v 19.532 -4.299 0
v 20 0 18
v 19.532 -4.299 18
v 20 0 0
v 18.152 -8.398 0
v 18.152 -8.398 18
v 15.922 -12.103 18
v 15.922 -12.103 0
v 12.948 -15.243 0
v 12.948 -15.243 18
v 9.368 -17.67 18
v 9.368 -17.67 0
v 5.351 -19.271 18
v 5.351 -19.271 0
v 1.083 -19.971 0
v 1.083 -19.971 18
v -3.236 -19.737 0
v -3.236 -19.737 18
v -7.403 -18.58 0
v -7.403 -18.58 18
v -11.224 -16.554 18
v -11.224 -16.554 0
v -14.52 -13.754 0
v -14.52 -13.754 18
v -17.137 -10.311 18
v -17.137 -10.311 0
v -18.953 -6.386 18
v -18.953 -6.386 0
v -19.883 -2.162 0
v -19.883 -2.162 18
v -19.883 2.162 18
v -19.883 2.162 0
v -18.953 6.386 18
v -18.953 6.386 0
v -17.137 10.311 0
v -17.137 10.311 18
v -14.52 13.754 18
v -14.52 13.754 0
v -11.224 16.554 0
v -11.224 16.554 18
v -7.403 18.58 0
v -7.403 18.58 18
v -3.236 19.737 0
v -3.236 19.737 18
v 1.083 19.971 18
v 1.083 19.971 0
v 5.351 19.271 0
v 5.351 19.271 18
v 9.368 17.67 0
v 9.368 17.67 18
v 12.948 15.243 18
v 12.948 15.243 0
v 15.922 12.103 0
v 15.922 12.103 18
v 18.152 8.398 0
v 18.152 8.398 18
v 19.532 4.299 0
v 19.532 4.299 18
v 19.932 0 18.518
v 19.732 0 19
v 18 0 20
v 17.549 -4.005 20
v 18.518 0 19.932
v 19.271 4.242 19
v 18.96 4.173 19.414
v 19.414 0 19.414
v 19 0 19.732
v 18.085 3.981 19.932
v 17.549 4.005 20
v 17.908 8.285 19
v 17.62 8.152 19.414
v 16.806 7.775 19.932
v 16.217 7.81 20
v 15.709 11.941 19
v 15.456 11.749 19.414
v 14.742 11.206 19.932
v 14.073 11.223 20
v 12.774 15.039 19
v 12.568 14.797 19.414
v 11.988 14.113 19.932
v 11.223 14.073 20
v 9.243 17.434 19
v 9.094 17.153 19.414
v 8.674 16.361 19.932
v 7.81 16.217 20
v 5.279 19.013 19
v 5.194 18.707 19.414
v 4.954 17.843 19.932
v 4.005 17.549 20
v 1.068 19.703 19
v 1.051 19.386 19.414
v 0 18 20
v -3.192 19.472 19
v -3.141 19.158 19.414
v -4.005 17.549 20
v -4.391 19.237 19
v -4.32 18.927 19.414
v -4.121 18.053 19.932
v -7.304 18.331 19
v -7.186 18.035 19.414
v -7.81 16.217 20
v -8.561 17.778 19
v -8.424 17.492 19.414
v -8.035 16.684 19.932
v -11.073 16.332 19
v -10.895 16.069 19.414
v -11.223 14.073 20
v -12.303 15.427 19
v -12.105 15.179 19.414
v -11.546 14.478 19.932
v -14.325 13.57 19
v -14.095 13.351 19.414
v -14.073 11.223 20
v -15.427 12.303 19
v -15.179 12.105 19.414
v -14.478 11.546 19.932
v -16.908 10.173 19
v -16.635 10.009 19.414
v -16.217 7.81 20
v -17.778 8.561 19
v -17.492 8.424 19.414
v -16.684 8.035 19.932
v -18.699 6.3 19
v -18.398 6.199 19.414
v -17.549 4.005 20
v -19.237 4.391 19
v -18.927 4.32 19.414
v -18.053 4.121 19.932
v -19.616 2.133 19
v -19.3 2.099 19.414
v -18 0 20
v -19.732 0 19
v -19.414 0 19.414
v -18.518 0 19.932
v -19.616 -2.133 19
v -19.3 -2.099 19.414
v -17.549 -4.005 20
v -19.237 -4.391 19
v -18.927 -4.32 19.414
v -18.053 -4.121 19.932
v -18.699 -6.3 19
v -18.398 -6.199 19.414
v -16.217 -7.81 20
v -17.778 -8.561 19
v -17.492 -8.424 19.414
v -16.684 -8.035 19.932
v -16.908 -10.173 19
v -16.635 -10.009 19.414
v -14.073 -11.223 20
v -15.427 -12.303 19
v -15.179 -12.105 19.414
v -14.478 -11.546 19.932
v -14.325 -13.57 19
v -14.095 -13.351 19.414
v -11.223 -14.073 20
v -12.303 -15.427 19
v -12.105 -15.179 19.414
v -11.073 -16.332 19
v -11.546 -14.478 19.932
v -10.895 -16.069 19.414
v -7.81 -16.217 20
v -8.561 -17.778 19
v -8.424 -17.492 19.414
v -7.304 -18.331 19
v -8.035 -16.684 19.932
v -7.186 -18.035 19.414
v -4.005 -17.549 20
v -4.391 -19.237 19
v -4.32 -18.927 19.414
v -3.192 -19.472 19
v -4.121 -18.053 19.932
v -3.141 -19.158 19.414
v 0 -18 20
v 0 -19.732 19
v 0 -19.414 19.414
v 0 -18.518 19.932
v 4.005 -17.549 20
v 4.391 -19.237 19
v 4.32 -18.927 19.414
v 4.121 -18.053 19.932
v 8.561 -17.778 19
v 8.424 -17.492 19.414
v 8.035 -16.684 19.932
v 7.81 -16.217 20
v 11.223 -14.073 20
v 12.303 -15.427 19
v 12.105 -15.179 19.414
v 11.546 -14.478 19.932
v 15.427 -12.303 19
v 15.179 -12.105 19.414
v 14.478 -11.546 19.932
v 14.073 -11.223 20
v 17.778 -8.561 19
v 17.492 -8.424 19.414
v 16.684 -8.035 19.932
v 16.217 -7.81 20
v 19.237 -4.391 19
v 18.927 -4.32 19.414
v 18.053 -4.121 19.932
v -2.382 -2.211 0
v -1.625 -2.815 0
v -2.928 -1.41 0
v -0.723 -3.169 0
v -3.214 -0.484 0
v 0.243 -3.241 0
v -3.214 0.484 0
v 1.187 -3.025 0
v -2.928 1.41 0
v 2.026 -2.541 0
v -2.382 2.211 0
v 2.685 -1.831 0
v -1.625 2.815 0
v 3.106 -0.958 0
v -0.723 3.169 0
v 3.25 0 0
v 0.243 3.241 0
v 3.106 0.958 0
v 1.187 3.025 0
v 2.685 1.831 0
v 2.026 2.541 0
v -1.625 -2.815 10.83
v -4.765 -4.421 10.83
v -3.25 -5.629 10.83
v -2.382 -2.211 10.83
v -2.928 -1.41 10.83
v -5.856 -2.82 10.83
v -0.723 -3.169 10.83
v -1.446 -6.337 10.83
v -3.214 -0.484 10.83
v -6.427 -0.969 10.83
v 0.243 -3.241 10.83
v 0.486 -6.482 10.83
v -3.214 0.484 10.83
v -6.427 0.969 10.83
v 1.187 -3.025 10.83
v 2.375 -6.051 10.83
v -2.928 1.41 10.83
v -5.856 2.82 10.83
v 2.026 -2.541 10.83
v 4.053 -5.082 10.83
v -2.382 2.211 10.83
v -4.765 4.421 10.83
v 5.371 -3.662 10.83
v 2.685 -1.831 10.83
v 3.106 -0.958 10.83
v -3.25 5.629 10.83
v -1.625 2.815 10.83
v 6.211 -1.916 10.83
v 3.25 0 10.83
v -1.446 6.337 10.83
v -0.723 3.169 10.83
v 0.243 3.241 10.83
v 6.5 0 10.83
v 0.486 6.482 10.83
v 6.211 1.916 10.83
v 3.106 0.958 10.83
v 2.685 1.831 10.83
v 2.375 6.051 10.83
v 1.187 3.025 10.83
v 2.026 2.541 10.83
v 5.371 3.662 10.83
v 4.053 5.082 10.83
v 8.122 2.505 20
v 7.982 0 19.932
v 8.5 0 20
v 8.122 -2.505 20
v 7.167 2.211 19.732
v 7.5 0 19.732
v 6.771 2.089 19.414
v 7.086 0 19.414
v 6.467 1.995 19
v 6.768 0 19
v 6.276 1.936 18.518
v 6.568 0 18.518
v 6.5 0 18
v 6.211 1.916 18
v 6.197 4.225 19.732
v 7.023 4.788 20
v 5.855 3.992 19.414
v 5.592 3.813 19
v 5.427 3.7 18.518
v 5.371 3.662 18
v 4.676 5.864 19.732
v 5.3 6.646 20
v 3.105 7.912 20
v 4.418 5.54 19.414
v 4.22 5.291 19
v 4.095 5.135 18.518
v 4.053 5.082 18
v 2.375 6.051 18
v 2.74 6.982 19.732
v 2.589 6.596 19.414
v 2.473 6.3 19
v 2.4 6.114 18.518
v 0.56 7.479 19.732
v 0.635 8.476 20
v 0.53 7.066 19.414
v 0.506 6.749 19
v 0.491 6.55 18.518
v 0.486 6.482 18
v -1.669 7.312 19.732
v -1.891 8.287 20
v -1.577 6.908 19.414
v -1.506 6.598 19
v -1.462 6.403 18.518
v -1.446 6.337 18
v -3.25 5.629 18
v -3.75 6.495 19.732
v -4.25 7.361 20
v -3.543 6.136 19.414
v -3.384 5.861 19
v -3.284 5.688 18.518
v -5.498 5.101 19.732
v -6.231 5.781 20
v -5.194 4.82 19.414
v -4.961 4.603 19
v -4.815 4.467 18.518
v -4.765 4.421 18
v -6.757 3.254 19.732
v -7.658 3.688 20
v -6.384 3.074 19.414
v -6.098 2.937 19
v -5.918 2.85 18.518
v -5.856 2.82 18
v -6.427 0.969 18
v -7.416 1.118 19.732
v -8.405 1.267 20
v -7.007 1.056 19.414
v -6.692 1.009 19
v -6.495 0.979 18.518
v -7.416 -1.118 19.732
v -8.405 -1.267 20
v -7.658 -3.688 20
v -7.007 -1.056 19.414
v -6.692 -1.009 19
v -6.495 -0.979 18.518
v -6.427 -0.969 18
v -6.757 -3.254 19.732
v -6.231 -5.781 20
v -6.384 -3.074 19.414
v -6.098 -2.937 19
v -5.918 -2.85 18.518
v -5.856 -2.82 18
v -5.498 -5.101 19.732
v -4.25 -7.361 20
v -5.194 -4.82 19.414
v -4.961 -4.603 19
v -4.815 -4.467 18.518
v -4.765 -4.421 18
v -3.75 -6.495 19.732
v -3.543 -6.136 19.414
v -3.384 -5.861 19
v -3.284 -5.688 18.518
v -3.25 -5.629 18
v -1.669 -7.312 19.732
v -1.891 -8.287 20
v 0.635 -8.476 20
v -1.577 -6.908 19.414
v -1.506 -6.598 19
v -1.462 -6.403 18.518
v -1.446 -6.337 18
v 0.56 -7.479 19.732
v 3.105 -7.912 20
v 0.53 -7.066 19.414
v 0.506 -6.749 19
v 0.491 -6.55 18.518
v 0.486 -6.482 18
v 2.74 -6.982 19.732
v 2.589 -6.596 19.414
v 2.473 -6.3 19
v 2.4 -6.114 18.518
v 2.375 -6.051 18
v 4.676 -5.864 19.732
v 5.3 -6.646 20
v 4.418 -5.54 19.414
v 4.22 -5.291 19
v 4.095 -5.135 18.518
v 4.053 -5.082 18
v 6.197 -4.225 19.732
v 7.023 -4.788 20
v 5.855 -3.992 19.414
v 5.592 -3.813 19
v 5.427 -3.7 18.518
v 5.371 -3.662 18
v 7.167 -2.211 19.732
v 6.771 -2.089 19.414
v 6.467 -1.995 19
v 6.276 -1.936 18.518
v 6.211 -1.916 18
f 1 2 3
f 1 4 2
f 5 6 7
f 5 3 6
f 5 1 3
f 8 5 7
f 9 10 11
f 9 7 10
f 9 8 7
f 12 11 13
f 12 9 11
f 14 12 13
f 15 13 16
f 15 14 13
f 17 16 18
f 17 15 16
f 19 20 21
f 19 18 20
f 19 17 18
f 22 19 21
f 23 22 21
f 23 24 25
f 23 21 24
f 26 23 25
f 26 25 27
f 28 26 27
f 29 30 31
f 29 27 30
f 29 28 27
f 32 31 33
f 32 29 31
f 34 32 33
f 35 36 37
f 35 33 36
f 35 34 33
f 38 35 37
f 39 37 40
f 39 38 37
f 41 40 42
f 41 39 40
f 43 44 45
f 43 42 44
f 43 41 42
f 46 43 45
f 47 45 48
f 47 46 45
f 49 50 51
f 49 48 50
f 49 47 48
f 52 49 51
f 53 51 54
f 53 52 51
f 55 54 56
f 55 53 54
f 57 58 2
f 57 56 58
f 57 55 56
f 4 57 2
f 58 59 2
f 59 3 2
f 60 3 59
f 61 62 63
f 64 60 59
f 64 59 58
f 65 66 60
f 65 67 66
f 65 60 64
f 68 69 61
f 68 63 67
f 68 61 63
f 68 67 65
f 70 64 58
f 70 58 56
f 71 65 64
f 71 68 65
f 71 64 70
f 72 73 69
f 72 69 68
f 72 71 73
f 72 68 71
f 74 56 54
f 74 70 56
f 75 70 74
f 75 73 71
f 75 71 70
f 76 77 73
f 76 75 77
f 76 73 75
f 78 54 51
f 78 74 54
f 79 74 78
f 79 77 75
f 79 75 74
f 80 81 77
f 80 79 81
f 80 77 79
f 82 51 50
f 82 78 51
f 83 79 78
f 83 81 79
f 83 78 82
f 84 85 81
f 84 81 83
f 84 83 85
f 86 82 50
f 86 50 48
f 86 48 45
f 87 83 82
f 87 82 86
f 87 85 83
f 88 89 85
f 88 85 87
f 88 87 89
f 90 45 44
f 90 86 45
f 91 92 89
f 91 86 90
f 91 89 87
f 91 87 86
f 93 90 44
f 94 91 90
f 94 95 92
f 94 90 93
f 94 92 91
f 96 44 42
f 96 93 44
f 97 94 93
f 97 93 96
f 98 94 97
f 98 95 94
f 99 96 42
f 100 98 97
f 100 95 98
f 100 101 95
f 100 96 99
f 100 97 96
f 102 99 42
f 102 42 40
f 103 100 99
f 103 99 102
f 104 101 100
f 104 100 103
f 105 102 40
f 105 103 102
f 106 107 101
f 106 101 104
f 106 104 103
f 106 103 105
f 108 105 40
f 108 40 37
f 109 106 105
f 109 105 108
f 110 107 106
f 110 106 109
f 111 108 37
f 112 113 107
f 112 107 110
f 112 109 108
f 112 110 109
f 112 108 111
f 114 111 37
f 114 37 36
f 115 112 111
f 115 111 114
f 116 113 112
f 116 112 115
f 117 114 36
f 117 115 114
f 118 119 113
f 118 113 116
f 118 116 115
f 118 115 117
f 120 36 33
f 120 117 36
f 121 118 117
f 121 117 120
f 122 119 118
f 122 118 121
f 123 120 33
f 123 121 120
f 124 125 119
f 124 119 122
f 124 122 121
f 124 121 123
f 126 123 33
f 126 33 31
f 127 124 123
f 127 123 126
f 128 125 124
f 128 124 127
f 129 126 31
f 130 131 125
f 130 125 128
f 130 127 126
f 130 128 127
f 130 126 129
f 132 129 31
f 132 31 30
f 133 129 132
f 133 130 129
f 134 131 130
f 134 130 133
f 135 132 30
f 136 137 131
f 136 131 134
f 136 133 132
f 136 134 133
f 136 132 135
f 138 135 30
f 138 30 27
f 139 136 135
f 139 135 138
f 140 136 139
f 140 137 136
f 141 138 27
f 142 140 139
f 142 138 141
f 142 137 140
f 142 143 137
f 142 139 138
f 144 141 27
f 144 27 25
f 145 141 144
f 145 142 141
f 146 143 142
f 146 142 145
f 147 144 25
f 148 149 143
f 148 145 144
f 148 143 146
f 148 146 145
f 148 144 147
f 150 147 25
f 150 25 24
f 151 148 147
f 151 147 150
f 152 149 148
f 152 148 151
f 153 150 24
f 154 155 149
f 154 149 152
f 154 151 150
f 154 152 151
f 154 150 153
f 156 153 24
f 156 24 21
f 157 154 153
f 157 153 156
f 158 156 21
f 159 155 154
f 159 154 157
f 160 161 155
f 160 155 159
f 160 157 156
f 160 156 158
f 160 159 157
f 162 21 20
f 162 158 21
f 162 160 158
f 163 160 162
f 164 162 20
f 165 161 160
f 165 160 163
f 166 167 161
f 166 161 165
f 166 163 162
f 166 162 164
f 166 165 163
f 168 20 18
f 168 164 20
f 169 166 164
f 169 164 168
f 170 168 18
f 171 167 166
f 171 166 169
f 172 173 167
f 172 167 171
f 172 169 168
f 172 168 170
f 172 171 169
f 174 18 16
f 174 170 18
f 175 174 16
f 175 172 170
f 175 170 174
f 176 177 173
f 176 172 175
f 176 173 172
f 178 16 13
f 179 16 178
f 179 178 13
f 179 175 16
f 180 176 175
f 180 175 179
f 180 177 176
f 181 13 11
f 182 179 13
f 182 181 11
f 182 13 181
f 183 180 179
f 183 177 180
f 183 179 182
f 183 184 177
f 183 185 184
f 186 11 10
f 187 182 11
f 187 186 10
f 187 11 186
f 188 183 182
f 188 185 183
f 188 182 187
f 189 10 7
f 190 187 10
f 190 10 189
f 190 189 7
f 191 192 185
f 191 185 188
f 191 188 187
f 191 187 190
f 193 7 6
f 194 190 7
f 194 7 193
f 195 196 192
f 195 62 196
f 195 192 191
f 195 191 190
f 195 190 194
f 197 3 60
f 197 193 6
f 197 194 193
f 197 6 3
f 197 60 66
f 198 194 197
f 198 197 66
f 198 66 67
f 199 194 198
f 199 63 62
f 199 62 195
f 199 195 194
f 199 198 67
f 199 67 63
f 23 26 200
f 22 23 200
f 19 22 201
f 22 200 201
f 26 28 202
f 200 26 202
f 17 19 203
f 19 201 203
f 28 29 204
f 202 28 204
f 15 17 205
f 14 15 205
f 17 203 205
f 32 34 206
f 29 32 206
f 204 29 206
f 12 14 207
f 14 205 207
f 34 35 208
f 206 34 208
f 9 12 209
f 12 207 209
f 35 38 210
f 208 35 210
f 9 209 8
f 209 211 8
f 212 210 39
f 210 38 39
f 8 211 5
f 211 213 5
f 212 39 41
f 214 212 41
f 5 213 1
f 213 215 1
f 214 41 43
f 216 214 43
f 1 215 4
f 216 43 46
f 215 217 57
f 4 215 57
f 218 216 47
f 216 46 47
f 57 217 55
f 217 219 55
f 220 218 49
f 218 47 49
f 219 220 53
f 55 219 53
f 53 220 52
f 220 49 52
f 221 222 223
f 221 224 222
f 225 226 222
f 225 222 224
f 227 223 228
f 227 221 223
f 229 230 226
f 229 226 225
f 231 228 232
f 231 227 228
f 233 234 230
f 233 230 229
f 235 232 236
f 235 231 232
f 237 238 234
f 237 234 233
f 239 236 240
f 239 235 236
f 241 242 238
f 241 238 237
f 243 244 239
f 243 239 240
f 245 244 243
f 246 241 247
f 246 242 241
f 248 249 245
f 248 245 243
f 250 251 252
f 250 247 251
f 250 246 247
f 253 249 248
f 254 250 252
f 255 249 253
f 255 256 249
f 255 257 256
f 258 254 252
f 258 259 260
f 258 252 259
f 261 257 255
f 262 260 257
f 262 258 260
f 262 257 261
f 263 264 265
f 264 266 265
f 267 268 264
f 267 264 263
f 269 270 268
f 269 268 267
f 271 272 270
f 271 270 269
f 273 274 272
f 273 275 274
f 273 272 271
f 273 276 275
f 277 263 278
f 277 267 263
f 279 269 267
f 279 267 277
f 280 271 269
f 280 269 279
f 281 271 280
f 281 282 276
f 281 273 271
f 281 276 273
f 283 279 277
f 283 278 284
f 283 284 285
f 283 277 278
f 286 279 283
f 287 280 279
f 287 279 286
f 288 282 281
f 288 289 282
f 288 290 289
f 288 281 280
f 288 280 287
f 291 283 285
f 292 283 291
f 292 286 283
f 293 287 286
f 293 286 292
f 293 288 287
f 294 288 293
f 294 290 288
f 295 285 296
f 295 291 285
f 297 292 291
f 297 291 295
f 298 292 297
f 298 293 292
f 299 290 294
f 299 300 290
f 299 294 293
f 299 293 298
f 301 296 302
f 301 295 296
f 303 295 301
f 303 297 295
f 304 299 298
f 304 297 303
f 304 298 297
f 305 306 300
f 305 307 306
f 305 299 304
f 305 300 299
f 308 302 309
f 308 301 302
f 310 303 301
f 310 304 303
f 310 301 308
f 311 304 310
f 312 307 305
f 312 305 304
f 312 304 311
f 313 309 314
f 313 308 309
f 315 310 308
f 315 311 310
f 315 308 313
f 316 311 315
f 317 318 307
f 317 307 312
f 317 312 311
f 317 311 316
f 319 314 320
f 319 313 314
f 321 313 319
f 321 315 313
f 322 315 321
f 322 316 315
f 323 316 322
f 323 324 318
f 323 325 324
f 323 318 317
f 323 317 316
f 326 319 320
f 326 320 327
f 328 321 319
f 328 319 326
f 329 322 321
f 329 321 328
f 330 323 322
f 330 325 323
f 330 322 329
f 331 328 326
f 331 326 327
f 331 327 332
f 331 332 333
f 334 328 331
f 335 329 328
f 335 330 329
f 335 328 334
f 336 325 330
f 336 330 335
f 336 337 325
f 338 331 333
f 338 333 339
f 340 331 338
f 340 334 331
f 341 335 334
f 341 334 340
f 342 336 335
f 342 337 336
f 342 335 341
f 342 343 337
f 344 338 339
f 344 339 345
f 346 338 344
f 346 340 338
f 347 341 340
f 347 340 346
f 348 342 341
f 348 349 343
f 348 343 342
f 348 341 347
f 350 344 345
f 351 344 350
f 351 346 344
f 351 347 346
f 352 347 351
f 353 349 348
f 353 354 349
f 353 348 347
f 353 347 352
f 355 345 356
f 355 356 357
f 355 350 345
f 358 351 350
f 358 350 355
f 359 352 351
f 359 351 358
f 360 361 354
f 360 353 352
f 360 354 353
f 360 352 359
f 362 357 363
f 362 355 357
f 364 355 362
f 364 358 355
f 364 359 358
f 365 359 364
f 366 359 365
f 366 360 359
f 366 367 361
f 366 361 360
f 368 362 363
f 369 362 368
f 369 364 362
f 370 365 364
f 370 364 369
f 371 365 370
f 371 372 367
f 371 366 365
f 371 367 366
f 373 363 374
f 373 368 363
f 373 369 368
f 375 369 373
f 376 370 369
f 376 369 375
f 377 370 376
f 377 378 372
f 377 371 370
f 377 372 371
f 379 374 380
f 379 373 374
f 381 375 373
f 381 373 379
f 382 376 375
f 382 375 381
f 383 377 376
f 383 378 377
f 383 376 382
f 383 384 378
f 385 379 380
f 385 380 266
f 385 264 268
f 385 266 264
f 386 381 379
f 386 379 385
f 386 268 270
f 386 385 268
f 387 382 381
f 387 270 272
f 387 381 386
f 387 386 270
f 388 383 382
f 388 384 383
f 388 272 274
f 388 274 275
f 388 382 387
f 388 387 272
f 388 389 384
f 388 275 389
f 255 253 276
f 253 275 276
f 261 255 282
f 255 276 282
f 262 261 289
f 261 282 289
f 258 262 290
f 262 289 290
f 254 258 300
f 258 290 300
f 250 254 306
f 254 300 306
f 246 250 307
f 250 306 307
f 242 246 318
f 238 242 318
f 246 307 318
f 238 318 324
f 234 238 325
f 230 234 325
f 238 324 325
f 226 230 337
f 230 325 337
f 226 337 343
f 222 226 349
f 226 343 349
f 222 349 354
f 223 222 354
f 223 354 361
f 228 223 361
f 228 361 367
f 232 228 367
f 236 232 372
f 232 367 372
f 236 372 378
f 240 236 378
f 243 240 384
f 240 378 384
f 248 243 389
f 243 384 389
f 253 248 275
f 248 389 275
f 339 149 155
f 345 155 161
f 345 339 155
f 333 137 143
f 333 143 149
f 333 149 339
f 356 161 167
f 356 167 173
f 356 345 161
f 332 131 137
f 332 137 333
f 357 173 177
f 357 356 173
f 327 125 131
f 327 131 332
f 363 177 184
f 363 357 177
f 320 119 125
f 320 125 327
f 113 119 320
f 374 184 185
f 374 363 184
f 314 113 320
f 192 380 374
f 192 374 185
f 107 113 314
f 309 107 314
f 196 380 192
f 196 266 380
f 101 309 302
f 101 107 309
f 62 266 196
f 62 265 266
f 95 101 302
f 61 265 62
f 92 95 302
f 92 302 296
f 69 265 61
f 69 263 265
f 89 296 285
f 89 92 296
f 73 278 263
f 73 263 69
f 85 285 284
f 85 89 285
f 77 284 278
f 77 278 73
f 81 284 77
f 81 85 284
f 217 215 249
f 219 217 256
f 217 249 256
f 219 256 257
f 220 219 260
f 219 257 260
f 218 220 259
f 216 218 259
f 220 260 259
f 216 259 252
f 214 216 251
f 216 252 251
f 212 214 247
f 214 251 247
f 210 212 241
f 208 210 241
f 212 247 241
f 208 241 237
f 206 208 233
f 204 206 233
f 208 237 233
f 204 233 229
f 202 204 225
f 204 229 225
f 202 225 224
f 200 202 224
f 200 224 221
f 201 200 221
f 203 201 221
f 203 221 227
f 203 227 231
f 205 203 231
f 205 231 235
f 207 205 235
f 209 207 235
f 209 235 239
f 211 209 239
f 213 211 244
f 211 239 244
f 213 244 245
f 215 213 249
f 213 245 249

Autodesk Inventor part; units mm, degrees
ref_plane "YZ Plane" through (0, 0, 0) normal (1, 0, 0) x (0, 1, 0)
ref_plane "XZ Plane" through (0, 0, 0) normal (0, 1, 0) x (-1, 0, 0)
ref_plane "XY Plane" through (0, 0, 0) normal (0, 0, 1) x (1, 0, 0)
sketch "Sketch1" plane through (0, 0, 0) normal (0, 0, 1) x (1, 0, 0)
  circle A0 centre (0, 0) radius 20
  dimension "d0" = 40
extrude "Extrusion1" add sketch "Sketch1" along normal blind 20
sketch "Sketch2" plane through (0, 0, 20) normal (0, 0, 1) x (1, 0, 0)
  circle A0 centre (0, 0) radius 20 projected
  circle A1 centre (0, 0) radius 6.5
  dimension "d4" = 13
extrude "Extrusion2" cut sketch "Sketch2" against normal blind 9.17 contours A1
sketch "Sketch3" plane through (0, 0, 10.83) normal (0, 0, 1) x (1, 0, 0)
  circle A0 centre (0, 0) radius 6.5 projected
  circle A1 centre (0, 0) radius 3.25
  dimension "d8" = 6.5
extrude "Extrusion3" cut sketch "Sketch3" against normal through all contours A1
fillet "Fillet1" radius 2 2 edges at (-20, 0, 20) (-6.5, 0, 20)
properties part number "foot"
